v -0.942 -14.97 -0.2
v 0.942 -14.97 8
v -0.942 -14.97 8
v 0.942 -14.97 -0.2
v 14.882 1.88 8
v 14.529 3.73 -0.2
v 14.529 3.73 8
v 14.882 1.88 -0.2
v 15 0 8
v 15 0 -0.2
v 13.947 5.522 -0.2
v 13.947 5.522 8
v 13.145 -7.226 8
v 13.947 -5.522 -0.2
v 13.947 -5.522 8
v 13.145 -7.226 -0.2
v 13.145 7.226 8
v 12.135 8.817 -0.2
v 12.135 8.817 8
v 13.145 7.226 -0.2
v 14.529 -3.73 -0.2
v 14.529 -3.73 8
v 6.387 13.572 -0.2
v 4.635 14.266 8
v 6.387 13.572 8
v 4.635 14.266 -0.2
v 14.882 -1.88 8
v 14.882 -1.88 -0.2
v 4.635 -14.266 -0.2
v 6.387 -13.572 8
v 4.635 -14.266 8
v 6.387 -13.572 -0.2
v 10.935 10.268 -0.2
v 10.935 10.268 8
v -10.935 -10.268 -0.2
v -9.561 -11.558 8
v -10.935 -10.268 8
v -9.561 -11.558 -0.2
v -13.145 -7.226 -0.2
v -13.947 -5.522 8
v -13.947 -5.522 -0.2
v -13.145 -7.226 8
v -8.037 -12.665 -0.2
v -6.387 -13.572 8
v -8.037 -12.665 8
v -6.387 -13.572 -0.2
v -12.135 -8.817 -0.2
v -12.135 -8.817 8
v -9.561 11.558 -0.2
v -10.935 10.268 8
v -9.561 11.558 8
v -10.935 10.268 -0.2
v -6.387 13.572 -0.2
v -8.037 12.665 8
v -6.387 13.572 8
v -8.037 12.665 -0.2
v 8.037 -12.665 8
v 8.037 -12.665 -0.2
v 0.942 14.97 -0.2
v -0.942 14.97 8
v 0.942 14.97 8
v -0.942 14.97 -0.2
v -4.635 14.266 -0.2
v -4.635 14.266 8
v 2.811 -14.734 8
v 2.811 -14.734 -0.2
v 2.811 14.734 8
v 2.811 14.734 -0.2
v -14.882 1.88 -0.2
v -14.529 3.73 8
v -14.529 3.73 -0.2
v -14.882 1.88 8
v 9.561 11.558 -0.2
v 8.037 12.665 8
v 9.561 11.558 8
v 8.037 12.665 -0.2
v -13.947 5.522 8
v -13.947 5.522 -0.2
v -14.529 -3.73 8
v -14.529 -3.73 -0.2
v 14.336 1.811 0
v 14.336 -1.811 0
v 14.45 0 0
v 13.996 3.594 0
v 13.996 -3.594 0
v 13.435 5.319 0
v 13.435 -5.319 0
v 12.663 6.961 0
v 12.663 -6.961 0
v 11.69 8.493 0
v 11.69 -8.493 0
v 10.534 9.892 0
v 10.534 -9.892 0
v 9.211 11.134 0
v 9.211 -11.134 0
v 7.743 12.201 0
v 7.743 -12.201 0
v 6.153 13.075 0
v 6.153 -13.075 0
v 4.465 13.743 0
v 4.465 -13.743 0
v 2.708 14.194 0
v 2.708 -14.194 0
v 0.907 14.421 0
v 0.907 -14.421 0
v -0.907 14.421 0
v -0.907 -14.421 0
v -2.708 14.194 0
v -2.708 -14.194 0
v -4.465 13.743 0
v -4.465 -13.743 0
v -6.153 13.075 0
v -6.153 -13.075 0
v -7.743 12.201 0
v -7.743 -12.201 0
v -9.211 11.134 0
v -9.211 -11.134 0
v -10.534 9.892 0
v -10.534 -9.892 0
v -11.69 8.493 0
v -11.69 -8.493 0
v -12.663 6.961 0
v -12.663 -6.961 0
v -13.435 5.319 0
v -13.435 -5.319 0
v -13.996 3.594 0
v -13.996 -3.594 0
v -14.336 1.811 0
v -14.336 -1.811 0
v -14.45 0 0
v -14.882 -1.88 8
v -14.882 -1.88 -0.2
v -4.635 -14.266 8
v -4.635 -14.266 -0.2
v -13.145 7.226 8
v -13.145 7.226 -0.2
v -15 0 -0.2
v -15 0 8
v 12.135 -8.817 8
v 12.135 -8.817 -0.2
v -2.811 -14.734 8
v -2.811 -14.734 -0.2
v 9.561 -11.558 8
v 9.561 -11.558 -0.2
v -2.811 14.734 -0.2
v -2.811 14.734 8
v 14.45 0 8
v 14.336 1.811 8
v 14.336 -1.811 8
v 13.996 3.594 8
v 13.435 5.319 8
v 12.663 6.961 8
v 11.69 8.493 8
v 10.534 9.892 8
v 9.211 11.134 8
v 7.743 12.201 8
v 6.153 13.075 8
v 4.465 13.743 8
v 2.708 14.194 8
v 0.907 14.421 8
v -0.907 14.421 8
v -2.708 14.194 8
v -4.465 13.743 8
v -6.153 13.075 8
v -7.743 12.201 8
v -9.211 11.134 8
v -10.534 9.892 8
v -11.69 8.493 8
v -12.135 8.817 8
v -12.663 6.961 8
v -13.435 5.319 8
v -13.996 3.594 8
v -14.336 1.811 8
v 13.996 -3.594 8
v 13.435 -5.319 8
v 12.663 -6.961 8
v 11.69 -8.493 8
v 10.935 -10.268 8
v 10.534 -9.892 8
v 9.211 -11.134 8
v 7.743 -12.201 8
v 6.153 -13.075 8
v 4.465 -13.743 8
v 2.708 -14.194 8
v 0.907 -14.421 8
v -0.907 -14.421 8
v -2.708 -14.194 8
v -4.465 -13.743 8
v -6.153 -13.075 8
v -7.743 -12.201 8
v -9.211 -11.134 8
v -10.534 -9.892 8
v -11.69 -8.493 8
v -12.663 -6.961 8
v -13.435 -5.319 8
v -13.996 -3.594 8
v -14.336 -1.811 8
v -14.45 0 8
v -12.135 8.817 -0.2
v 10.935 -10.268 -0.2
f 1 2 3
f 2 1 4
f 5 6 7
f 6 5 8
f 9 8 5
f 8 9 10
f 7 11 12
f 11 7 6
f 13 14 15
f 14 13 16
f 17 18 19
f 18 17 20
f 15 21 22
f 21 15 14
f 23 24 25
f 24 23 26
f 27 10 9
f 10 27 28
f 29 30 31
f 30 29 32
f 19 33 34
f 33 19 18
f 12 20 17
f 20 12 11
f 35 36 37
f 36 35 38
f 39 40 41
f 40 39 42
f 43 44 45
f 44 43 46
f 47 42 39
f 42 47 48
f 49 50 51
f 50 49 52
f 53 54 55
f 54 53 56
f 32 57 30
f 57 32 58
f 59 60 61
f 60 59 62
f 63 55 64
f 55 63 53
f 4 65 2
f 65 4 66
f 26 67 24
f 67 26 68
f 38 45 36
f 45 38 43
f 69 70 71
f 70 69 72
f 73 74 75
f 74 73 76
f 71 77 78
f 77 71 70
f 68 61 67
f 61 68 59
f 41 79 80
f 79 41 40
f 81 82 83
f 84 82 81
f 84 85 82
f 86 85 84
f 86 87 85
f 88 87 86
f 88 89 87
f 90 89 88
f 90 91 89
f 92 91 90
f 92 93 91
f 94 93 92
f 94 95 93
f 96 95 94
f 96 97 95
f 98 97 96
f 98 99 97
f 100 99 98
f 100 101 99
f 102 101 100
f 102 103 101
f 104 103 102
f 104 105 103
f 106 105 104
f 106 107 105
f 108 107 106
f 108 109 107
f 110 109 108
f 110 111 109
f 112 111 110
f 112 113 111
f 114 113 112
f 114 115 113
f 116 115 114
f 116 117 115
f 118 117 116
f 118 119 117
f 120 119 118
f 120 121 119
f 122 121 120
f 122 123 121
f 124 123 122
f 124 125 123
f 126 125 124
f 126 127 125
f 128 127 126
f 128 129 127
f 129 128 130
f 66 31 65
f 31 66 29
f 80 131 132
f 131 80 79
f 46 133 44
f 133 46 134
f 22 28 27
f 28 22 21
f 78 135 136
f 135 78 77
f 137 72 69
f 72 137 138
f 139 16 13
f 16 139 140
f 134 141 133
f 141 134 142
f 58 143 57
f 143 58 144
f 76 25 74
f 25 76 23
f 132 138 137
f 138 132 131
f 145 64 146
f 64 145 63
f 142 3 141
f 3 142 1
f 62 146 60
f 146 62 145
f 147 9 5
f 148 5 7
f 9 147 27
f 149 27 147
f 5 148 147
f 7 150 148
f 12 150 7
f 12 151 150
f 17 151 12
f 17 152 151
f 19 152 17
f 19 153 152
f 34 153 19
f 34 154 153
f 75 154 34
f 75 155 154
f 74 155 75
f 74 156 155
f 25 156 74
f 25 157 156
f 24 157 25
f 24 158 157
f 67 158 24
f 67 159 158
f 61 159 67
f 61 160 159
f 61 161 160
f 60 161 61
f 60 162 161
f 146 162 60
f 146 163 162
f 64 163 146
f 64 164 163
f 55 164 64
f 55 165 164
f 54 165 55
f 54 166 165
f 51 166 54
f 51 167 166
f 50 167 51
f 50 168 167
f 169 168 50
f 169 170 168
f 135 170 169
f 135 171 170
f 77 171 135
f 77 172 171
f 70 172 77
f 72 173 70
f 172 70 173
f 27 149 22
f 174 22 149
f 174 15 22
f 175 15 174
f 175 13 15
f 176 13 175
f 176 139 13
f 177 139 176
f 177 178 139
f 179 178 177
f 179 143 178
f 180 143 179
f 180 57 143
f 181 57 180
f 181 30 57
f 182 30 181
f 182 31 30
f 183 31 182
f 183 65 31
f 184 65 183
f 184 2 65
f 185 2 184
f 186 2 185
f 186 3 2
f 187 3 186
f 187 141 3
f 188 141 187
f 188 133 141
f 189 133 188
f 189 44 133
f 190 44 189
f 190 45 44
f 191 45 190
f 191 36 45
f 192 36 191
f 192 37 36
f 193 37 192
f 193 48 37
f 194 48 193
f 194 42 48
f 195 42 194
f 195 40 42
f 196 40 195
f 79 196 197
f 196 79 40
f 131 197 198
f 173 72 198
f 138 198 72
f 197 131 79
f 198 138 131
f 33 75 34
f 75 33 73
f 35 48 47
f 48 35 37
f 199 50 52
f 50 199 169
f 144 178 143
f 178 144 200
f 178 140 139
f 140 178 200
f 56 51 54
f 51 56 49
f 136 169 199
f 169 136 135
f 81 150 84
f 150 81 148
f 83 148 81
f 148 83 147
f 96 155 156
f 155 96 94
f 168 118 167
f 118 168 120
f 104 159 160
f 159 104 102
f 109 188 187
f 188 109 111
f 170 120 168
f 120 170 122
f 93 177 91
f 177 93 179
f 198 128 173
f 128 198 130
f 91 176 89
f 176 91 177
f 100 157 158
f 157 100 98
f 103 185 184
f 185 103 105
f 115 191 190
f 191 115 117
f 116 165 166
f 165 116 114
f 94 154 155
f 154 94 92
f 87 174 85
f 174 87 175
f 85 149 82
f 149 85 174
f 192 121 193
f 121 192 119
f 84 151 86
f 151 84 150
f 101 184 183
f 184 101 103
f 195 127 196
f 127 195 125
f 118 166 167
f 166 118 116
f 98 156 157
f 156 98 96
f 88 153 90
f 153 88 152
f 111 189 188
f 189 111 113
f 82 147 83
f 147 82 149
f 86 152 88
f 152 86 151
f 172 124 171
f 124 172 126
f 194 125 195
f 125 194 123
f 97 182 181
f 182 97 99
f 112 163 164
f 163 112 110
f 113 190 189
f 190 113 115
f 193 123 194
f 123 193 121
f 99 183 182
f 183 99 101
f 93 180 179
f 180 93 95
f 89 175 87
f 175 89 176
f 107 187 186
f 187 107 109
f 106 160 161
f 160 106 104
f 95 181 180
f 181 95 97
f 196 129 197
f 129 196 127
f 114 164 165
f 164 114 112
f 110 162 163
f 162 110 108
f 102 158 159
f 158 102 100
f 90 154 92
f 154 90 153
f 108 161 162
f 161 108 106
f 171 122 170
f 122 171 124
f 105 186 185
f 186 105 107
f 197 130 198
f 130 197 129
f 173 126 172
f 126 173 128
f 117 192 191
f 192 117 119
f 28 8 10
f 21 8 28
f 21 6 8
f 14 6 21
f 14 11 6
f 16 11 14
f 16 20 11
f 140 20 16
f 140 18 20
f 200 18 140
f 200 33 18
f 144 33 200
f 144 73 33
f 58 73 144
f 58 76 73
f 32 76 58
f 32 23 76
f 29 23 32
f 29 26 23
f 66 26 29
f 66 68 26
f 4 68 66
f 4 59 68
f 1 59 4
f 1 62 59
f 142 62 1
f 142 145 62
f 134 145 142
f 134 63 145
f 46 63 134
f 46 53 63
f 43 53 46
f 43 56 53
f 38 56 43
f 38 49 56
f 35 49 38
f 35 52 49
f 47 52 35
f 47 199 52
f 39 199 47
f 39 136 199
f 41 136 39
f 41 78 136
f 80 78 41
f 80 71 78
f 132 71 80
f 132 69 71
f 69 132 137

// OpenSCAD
//Diameter of cylinder
diameter=30;
//Width of single wall layer
extrusionWidth=0.55;
//Height of cylinder
height=8;
//Height/thickness of bottom (0 for no bottom)
layerHeight=0.2;


/* [hidden] */
rad=diameter/2;
$fn=50;

union() {
translate([0,0,-layerHeight]) cylinder(r=rad, h=layerHeight);
	difference () {
		cylinder(r=rad, h=height);
		translate([0,0,-1])
		cylinder(r=rad-extrusionWidth, h=height+2);
	}
}
